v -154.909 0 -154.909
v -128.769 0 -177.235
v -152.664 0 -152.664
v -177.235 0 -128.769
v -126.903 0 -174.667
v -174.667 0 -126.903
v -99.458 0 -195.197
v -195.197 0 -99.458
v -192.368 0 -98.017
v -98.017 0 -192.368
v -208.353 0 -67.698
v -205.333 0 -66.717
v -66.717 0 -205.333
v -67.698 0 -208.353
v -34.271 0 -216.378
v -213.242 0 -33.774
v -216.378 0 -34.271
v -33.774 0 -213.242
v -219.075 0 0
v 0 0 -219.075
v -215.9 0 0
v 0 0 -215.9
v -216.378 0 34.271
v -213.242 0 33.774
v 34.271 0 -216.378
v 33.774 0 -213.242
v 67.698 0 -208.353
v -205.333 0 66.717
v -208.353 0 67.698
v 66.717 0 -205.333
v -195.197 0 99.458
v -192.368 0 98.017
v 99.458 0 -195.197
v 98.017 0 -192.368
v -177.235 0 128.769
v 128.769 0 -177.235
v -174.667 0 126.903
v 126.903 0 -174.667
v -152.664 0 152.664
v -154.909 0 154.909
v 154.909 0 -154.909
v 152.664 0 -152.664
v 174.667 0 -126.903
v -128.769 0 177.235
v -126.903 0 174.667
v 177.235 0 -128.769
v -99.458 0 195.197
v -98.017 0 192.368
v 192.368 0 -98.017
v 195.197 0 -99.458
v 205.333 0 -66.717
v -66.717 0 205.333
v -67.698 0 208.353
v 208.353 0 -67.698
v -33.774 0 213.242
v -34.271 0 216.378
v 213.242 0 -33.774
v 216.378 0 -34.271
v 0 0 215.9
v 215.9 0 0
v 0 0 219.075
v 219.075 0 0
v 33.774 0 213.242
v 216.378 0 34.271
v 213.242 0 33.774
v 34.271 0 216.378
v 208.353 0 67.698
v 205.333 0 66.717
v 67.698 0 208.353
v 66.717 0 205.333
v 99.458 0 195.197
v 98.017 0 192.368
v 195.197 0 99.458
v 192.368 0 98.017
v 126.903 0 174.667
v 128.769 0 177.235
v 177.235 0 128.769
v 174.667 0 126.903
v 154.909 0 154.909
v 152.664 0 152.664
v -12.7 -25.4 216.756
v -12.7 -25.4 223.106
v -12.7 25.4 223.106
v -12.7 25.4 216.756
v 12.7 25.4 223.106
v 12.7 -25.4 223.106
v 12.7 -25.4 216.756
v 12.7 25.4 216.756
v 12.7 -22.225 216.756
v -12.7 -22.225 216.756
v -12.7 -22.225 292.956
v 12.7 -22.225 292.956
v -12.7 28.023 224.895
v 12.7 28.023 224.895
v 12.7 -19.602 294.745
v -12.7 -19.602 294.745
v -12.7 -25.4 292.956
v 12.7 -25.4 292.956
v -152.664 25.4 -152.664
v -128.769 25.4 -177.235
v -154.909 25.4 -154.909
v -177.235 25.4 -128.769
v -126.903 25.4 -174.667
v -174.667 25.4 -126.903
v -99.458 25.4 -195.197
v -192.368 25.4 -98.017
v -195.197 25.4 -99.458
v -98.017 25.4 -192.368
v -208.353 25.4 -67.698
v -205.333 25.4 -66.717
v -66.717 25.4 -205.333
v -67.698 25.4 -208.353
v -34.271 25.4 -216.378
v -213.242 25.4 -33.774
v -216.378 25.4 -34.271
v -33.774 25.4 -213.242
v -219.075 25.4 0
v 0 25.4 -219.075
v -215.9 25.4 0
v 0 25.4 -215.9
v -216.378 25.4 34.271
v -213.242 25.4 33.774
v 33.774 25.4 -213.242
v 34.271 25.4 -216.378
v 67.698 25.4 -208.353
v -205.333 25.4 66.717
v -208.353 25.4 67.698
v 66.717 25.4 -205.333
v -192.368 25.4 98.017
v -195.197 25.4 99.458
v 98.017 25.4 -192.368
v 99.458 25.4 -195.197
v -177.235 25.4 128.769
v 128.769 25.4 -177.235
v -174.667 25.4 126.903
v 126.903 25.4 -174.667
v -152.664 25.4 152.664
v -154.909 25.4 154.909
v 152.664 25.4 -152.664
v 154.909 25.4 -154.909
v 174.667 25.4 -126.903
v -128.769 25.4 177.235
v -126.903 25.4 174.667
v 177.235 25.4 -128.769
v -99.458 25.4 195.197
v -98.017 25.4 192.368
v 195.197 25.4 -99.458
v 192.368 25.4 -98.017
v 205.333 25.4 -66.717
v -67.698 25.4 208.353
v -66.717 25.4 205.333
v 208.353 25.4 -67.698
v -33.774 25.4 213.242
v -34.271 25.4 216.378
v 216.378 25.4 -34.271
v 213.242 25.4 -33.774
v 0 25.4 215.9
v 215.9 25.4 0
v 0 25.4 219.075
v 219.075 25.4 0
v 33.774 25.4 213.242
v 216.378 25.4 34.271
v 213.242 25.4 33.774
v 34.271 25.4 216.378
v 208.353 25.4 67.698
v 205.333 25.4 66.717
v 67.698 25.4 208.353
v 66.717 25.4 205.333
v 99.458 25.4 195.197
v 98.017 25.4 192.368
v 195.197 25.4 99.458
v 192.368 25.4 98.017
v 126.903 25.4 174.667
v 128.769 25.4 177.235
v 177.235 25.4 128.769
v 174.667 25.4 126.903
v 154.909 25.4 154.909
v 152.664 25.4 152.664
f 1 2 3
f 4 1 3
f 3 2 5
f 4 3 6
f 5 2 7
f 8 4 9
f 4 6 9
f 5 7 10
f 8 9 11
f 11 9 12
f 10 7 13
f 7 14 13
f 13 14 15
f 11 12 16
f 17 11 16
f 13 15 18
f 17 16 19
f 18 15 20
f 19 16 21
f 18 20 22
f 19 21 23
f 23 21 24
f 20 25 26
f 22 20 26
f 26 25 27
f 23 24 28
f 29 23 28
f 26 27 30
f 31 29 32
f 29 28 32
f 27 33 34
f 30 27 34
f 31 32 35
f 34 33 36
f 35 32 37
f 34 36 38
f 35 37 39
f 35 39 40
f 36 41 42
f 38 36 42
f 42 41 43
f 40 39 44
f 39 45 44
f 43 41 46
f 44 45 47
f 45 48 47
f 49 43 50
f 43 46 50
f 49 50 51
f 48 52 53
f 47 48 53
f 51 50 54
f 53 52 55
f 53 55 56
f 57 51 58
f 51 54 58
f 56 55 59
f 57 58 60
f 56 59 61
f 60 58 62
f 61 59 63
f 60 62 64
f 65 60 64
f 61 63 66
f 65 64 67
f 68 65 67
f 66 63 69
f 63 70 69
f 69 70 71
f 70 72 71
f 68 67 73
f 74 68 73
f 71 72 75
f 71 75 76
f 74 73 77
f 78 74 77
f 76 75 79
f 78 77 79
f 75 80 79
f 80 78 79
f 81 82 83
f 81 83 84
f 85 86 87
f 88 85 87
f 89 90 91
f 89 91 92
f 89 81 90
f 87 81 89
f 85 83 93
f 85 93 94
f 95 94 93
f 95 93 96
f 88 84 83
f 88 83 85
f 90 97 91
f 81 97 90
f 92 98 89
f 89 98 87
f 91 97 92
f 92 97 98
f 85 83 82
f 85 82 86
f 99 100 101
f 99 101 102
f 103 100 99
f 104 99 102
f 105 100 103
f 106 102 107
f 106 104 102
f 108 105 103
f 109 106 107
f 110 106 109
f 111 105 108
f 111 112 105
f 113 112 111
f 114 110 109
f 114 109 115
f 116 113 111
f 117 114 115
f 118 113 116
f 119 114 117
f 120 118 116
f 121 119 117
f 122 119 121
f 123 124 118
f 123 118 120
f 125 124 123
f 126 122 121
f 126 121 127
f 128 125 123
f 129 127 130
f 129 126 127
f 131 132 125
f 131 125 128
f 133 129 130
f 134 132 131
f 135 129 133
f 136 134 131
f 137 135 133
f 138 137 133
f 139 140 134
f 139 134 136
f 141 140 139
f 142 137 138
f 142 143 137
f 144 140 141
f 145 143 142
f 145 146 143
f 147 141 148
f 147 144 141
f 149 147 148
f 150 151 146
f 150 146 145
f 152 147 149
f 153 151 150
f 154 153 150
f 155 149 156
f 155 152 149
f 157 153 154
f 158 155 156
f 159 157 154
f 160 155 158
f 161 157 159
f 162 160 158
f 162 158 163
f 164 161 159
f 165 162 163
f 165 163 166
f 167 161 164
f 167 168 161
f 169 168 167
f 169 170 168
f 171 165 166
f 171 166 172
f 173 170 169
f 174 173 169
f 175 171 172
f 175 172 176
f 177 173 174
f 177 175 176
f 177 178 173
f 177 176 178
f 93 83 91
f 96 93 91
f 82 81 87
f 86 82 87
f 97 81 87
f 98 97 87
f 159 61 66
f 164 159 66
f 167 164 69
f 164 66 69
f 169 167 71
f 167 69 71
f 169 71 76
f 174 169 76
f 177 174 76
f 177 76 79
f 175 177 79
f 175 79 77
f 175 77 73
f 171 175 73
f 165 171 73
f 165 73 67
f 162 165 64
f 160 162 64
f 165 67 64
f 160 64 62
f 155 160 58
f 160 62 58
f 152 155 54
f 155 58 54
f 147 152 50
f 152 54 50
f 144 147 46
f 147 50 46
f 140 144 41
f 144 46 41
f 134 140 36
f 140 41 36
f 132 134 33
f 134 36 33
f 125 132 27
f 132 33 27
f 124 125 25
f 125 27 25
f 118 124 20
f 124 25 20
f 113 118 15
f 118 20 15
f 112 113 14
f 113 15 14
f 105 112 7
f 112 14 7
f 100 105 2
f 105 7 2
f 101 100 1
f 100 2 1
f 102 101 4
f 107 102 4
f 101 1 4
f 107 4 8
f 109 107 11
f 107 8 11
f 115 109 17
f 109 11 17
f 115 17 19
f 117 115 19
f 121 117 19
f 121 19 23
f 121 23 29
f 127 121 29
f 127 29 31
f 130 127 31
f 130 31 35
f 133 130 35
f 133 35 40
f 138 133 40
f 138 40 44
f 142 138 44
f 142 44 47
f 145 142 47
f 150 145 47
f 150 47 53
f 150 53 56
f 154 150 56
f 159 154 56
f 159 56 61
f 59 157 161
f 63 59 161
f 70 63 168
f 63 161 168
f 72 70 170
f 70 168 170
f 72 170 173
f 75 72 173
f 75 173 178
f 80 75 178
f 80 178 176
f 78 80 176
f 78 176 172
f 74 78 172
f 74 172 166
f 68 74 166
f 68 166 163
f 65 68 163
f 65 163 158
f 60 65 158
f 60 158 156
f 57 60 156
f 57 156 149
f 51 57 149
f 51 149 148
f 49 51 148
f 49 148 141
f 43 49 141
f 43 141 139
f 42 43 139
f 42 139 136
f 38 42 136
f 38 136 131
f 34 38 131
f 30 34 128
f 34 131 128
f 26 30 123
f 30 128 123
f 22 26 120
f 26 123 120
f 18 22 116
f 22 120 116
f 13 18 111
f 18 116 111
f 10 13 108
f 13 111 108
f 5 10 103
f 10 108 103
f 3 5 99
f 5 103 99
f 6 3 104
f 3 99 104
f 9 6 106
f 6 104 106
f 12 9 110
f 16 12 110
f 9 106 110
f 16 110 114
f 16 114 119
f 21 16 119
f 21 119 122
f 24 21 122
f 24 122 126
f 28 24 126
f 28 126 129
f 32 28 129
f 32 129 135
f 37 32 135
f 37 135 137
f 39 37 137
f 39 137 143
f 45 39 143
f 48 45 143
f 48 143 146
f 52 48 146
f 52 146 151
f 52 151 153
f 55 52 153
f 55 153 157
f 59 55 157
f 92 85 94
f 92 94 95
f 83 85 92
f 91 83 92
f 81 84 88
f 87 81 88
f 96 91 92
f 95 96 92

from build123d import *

# Parameters (mm, degrees)
SKETCH1_R            = 219.075
BOSS_EXTRUDE1_DEPTH  = 25.4
SKETCH2_R            = 215.9
CUT_EXTRUDE1_DEPTH   = 311.858281617
SKETCH7_W            = 25.4
SKETCH7_H            = 6.35
BOSS_EXTRUDE7_DEPTH  = 50.8
SKETCH13_W           = 25.4
SKETCH13_H           = 76.2
BOSS_EXTRUDE11_DEPTH = 3.175
SKETCH22_W           = 84.540896168
SKETCH22_H           = 25.4
BOSS_EXTRUDE12_DEPTH = 3.175


with BuildPart() as part:
    # Sketch1 → Boss-Extrude1 (new body)
    with BuildSketch(Plane(origin=(0, 0, 0), x_dir=(1, 0, 0), z_dir=(0, 1, 0))):
        with Locations(Location((0, 0, 0), (0, 0, 270))):
            Circle(SKETCH1_R)
    extrude(amount=BOSS_EXTRUDE1_DEPTH)

    # Sketch2 → Cut-Extrude1 (cut, through all)
    with BuildSketch(Plane(origin=(0, 25.4, 0), x_dir=(1, 0, 0), z_dir=(0, 1, 0))):
        with Locations(Location((0, 0, 0), (0, 0, 270))):
            Circle(SKETCH2_R)
    extrude(amount=-CUT_EXTRUDE1_DEPTH, mode=Mode.SUBTRACT)


with BuildPart() as body_2:
    # Sketch7 → Boss-Extrude7 (new body)
    with BuildSketch(Plane(origin=(0, -25.4, 0), x_dir=(1, 0, 0), z_dir=(0, 1, 0))):
        with Locations((0, -219.931380434)):
            Rectangle(SKETCH7_W, SKETCH7_H)
    extrude(amount=BOSS_EXTRUDE7_DEPTH)


with BuildPart() as body_3:
    # Sketch13 → Boss-Extrude11 (new body)
    with BuildSketch(Plane(origin=(0, -25.4, 0), x_dir=(1, 0, 0), z_dir=(0, 1, 0))):
        with Locations((0, -254.856380434)):
            Rectangle(SKETCH13_W, SKETCH13_H)
    extrude(amount=BOSS_EXTRUDE11_DEPTH)


with BuildPart() as body_4:
    # Sketch22 → Boss-Extrude12 (new body)
    with BuildSketch(Plane(origin=(0, 121.182941528, 82.62473286), x_dir=(0, -0.5633368246415097, 0.8262273428075478), z_dir=(0, 0.8262273428075478, 0.5633368246415097))):
        with Locations((212.298284608, 0)):
            Rectangle(SKETCH22_W, SKETCH22_H)
    extrude(amount=BOSS_EXTRUDE12_DEPTH)


solid = Compound([part.part, body_2.part, body_3.part, body_4.part])
